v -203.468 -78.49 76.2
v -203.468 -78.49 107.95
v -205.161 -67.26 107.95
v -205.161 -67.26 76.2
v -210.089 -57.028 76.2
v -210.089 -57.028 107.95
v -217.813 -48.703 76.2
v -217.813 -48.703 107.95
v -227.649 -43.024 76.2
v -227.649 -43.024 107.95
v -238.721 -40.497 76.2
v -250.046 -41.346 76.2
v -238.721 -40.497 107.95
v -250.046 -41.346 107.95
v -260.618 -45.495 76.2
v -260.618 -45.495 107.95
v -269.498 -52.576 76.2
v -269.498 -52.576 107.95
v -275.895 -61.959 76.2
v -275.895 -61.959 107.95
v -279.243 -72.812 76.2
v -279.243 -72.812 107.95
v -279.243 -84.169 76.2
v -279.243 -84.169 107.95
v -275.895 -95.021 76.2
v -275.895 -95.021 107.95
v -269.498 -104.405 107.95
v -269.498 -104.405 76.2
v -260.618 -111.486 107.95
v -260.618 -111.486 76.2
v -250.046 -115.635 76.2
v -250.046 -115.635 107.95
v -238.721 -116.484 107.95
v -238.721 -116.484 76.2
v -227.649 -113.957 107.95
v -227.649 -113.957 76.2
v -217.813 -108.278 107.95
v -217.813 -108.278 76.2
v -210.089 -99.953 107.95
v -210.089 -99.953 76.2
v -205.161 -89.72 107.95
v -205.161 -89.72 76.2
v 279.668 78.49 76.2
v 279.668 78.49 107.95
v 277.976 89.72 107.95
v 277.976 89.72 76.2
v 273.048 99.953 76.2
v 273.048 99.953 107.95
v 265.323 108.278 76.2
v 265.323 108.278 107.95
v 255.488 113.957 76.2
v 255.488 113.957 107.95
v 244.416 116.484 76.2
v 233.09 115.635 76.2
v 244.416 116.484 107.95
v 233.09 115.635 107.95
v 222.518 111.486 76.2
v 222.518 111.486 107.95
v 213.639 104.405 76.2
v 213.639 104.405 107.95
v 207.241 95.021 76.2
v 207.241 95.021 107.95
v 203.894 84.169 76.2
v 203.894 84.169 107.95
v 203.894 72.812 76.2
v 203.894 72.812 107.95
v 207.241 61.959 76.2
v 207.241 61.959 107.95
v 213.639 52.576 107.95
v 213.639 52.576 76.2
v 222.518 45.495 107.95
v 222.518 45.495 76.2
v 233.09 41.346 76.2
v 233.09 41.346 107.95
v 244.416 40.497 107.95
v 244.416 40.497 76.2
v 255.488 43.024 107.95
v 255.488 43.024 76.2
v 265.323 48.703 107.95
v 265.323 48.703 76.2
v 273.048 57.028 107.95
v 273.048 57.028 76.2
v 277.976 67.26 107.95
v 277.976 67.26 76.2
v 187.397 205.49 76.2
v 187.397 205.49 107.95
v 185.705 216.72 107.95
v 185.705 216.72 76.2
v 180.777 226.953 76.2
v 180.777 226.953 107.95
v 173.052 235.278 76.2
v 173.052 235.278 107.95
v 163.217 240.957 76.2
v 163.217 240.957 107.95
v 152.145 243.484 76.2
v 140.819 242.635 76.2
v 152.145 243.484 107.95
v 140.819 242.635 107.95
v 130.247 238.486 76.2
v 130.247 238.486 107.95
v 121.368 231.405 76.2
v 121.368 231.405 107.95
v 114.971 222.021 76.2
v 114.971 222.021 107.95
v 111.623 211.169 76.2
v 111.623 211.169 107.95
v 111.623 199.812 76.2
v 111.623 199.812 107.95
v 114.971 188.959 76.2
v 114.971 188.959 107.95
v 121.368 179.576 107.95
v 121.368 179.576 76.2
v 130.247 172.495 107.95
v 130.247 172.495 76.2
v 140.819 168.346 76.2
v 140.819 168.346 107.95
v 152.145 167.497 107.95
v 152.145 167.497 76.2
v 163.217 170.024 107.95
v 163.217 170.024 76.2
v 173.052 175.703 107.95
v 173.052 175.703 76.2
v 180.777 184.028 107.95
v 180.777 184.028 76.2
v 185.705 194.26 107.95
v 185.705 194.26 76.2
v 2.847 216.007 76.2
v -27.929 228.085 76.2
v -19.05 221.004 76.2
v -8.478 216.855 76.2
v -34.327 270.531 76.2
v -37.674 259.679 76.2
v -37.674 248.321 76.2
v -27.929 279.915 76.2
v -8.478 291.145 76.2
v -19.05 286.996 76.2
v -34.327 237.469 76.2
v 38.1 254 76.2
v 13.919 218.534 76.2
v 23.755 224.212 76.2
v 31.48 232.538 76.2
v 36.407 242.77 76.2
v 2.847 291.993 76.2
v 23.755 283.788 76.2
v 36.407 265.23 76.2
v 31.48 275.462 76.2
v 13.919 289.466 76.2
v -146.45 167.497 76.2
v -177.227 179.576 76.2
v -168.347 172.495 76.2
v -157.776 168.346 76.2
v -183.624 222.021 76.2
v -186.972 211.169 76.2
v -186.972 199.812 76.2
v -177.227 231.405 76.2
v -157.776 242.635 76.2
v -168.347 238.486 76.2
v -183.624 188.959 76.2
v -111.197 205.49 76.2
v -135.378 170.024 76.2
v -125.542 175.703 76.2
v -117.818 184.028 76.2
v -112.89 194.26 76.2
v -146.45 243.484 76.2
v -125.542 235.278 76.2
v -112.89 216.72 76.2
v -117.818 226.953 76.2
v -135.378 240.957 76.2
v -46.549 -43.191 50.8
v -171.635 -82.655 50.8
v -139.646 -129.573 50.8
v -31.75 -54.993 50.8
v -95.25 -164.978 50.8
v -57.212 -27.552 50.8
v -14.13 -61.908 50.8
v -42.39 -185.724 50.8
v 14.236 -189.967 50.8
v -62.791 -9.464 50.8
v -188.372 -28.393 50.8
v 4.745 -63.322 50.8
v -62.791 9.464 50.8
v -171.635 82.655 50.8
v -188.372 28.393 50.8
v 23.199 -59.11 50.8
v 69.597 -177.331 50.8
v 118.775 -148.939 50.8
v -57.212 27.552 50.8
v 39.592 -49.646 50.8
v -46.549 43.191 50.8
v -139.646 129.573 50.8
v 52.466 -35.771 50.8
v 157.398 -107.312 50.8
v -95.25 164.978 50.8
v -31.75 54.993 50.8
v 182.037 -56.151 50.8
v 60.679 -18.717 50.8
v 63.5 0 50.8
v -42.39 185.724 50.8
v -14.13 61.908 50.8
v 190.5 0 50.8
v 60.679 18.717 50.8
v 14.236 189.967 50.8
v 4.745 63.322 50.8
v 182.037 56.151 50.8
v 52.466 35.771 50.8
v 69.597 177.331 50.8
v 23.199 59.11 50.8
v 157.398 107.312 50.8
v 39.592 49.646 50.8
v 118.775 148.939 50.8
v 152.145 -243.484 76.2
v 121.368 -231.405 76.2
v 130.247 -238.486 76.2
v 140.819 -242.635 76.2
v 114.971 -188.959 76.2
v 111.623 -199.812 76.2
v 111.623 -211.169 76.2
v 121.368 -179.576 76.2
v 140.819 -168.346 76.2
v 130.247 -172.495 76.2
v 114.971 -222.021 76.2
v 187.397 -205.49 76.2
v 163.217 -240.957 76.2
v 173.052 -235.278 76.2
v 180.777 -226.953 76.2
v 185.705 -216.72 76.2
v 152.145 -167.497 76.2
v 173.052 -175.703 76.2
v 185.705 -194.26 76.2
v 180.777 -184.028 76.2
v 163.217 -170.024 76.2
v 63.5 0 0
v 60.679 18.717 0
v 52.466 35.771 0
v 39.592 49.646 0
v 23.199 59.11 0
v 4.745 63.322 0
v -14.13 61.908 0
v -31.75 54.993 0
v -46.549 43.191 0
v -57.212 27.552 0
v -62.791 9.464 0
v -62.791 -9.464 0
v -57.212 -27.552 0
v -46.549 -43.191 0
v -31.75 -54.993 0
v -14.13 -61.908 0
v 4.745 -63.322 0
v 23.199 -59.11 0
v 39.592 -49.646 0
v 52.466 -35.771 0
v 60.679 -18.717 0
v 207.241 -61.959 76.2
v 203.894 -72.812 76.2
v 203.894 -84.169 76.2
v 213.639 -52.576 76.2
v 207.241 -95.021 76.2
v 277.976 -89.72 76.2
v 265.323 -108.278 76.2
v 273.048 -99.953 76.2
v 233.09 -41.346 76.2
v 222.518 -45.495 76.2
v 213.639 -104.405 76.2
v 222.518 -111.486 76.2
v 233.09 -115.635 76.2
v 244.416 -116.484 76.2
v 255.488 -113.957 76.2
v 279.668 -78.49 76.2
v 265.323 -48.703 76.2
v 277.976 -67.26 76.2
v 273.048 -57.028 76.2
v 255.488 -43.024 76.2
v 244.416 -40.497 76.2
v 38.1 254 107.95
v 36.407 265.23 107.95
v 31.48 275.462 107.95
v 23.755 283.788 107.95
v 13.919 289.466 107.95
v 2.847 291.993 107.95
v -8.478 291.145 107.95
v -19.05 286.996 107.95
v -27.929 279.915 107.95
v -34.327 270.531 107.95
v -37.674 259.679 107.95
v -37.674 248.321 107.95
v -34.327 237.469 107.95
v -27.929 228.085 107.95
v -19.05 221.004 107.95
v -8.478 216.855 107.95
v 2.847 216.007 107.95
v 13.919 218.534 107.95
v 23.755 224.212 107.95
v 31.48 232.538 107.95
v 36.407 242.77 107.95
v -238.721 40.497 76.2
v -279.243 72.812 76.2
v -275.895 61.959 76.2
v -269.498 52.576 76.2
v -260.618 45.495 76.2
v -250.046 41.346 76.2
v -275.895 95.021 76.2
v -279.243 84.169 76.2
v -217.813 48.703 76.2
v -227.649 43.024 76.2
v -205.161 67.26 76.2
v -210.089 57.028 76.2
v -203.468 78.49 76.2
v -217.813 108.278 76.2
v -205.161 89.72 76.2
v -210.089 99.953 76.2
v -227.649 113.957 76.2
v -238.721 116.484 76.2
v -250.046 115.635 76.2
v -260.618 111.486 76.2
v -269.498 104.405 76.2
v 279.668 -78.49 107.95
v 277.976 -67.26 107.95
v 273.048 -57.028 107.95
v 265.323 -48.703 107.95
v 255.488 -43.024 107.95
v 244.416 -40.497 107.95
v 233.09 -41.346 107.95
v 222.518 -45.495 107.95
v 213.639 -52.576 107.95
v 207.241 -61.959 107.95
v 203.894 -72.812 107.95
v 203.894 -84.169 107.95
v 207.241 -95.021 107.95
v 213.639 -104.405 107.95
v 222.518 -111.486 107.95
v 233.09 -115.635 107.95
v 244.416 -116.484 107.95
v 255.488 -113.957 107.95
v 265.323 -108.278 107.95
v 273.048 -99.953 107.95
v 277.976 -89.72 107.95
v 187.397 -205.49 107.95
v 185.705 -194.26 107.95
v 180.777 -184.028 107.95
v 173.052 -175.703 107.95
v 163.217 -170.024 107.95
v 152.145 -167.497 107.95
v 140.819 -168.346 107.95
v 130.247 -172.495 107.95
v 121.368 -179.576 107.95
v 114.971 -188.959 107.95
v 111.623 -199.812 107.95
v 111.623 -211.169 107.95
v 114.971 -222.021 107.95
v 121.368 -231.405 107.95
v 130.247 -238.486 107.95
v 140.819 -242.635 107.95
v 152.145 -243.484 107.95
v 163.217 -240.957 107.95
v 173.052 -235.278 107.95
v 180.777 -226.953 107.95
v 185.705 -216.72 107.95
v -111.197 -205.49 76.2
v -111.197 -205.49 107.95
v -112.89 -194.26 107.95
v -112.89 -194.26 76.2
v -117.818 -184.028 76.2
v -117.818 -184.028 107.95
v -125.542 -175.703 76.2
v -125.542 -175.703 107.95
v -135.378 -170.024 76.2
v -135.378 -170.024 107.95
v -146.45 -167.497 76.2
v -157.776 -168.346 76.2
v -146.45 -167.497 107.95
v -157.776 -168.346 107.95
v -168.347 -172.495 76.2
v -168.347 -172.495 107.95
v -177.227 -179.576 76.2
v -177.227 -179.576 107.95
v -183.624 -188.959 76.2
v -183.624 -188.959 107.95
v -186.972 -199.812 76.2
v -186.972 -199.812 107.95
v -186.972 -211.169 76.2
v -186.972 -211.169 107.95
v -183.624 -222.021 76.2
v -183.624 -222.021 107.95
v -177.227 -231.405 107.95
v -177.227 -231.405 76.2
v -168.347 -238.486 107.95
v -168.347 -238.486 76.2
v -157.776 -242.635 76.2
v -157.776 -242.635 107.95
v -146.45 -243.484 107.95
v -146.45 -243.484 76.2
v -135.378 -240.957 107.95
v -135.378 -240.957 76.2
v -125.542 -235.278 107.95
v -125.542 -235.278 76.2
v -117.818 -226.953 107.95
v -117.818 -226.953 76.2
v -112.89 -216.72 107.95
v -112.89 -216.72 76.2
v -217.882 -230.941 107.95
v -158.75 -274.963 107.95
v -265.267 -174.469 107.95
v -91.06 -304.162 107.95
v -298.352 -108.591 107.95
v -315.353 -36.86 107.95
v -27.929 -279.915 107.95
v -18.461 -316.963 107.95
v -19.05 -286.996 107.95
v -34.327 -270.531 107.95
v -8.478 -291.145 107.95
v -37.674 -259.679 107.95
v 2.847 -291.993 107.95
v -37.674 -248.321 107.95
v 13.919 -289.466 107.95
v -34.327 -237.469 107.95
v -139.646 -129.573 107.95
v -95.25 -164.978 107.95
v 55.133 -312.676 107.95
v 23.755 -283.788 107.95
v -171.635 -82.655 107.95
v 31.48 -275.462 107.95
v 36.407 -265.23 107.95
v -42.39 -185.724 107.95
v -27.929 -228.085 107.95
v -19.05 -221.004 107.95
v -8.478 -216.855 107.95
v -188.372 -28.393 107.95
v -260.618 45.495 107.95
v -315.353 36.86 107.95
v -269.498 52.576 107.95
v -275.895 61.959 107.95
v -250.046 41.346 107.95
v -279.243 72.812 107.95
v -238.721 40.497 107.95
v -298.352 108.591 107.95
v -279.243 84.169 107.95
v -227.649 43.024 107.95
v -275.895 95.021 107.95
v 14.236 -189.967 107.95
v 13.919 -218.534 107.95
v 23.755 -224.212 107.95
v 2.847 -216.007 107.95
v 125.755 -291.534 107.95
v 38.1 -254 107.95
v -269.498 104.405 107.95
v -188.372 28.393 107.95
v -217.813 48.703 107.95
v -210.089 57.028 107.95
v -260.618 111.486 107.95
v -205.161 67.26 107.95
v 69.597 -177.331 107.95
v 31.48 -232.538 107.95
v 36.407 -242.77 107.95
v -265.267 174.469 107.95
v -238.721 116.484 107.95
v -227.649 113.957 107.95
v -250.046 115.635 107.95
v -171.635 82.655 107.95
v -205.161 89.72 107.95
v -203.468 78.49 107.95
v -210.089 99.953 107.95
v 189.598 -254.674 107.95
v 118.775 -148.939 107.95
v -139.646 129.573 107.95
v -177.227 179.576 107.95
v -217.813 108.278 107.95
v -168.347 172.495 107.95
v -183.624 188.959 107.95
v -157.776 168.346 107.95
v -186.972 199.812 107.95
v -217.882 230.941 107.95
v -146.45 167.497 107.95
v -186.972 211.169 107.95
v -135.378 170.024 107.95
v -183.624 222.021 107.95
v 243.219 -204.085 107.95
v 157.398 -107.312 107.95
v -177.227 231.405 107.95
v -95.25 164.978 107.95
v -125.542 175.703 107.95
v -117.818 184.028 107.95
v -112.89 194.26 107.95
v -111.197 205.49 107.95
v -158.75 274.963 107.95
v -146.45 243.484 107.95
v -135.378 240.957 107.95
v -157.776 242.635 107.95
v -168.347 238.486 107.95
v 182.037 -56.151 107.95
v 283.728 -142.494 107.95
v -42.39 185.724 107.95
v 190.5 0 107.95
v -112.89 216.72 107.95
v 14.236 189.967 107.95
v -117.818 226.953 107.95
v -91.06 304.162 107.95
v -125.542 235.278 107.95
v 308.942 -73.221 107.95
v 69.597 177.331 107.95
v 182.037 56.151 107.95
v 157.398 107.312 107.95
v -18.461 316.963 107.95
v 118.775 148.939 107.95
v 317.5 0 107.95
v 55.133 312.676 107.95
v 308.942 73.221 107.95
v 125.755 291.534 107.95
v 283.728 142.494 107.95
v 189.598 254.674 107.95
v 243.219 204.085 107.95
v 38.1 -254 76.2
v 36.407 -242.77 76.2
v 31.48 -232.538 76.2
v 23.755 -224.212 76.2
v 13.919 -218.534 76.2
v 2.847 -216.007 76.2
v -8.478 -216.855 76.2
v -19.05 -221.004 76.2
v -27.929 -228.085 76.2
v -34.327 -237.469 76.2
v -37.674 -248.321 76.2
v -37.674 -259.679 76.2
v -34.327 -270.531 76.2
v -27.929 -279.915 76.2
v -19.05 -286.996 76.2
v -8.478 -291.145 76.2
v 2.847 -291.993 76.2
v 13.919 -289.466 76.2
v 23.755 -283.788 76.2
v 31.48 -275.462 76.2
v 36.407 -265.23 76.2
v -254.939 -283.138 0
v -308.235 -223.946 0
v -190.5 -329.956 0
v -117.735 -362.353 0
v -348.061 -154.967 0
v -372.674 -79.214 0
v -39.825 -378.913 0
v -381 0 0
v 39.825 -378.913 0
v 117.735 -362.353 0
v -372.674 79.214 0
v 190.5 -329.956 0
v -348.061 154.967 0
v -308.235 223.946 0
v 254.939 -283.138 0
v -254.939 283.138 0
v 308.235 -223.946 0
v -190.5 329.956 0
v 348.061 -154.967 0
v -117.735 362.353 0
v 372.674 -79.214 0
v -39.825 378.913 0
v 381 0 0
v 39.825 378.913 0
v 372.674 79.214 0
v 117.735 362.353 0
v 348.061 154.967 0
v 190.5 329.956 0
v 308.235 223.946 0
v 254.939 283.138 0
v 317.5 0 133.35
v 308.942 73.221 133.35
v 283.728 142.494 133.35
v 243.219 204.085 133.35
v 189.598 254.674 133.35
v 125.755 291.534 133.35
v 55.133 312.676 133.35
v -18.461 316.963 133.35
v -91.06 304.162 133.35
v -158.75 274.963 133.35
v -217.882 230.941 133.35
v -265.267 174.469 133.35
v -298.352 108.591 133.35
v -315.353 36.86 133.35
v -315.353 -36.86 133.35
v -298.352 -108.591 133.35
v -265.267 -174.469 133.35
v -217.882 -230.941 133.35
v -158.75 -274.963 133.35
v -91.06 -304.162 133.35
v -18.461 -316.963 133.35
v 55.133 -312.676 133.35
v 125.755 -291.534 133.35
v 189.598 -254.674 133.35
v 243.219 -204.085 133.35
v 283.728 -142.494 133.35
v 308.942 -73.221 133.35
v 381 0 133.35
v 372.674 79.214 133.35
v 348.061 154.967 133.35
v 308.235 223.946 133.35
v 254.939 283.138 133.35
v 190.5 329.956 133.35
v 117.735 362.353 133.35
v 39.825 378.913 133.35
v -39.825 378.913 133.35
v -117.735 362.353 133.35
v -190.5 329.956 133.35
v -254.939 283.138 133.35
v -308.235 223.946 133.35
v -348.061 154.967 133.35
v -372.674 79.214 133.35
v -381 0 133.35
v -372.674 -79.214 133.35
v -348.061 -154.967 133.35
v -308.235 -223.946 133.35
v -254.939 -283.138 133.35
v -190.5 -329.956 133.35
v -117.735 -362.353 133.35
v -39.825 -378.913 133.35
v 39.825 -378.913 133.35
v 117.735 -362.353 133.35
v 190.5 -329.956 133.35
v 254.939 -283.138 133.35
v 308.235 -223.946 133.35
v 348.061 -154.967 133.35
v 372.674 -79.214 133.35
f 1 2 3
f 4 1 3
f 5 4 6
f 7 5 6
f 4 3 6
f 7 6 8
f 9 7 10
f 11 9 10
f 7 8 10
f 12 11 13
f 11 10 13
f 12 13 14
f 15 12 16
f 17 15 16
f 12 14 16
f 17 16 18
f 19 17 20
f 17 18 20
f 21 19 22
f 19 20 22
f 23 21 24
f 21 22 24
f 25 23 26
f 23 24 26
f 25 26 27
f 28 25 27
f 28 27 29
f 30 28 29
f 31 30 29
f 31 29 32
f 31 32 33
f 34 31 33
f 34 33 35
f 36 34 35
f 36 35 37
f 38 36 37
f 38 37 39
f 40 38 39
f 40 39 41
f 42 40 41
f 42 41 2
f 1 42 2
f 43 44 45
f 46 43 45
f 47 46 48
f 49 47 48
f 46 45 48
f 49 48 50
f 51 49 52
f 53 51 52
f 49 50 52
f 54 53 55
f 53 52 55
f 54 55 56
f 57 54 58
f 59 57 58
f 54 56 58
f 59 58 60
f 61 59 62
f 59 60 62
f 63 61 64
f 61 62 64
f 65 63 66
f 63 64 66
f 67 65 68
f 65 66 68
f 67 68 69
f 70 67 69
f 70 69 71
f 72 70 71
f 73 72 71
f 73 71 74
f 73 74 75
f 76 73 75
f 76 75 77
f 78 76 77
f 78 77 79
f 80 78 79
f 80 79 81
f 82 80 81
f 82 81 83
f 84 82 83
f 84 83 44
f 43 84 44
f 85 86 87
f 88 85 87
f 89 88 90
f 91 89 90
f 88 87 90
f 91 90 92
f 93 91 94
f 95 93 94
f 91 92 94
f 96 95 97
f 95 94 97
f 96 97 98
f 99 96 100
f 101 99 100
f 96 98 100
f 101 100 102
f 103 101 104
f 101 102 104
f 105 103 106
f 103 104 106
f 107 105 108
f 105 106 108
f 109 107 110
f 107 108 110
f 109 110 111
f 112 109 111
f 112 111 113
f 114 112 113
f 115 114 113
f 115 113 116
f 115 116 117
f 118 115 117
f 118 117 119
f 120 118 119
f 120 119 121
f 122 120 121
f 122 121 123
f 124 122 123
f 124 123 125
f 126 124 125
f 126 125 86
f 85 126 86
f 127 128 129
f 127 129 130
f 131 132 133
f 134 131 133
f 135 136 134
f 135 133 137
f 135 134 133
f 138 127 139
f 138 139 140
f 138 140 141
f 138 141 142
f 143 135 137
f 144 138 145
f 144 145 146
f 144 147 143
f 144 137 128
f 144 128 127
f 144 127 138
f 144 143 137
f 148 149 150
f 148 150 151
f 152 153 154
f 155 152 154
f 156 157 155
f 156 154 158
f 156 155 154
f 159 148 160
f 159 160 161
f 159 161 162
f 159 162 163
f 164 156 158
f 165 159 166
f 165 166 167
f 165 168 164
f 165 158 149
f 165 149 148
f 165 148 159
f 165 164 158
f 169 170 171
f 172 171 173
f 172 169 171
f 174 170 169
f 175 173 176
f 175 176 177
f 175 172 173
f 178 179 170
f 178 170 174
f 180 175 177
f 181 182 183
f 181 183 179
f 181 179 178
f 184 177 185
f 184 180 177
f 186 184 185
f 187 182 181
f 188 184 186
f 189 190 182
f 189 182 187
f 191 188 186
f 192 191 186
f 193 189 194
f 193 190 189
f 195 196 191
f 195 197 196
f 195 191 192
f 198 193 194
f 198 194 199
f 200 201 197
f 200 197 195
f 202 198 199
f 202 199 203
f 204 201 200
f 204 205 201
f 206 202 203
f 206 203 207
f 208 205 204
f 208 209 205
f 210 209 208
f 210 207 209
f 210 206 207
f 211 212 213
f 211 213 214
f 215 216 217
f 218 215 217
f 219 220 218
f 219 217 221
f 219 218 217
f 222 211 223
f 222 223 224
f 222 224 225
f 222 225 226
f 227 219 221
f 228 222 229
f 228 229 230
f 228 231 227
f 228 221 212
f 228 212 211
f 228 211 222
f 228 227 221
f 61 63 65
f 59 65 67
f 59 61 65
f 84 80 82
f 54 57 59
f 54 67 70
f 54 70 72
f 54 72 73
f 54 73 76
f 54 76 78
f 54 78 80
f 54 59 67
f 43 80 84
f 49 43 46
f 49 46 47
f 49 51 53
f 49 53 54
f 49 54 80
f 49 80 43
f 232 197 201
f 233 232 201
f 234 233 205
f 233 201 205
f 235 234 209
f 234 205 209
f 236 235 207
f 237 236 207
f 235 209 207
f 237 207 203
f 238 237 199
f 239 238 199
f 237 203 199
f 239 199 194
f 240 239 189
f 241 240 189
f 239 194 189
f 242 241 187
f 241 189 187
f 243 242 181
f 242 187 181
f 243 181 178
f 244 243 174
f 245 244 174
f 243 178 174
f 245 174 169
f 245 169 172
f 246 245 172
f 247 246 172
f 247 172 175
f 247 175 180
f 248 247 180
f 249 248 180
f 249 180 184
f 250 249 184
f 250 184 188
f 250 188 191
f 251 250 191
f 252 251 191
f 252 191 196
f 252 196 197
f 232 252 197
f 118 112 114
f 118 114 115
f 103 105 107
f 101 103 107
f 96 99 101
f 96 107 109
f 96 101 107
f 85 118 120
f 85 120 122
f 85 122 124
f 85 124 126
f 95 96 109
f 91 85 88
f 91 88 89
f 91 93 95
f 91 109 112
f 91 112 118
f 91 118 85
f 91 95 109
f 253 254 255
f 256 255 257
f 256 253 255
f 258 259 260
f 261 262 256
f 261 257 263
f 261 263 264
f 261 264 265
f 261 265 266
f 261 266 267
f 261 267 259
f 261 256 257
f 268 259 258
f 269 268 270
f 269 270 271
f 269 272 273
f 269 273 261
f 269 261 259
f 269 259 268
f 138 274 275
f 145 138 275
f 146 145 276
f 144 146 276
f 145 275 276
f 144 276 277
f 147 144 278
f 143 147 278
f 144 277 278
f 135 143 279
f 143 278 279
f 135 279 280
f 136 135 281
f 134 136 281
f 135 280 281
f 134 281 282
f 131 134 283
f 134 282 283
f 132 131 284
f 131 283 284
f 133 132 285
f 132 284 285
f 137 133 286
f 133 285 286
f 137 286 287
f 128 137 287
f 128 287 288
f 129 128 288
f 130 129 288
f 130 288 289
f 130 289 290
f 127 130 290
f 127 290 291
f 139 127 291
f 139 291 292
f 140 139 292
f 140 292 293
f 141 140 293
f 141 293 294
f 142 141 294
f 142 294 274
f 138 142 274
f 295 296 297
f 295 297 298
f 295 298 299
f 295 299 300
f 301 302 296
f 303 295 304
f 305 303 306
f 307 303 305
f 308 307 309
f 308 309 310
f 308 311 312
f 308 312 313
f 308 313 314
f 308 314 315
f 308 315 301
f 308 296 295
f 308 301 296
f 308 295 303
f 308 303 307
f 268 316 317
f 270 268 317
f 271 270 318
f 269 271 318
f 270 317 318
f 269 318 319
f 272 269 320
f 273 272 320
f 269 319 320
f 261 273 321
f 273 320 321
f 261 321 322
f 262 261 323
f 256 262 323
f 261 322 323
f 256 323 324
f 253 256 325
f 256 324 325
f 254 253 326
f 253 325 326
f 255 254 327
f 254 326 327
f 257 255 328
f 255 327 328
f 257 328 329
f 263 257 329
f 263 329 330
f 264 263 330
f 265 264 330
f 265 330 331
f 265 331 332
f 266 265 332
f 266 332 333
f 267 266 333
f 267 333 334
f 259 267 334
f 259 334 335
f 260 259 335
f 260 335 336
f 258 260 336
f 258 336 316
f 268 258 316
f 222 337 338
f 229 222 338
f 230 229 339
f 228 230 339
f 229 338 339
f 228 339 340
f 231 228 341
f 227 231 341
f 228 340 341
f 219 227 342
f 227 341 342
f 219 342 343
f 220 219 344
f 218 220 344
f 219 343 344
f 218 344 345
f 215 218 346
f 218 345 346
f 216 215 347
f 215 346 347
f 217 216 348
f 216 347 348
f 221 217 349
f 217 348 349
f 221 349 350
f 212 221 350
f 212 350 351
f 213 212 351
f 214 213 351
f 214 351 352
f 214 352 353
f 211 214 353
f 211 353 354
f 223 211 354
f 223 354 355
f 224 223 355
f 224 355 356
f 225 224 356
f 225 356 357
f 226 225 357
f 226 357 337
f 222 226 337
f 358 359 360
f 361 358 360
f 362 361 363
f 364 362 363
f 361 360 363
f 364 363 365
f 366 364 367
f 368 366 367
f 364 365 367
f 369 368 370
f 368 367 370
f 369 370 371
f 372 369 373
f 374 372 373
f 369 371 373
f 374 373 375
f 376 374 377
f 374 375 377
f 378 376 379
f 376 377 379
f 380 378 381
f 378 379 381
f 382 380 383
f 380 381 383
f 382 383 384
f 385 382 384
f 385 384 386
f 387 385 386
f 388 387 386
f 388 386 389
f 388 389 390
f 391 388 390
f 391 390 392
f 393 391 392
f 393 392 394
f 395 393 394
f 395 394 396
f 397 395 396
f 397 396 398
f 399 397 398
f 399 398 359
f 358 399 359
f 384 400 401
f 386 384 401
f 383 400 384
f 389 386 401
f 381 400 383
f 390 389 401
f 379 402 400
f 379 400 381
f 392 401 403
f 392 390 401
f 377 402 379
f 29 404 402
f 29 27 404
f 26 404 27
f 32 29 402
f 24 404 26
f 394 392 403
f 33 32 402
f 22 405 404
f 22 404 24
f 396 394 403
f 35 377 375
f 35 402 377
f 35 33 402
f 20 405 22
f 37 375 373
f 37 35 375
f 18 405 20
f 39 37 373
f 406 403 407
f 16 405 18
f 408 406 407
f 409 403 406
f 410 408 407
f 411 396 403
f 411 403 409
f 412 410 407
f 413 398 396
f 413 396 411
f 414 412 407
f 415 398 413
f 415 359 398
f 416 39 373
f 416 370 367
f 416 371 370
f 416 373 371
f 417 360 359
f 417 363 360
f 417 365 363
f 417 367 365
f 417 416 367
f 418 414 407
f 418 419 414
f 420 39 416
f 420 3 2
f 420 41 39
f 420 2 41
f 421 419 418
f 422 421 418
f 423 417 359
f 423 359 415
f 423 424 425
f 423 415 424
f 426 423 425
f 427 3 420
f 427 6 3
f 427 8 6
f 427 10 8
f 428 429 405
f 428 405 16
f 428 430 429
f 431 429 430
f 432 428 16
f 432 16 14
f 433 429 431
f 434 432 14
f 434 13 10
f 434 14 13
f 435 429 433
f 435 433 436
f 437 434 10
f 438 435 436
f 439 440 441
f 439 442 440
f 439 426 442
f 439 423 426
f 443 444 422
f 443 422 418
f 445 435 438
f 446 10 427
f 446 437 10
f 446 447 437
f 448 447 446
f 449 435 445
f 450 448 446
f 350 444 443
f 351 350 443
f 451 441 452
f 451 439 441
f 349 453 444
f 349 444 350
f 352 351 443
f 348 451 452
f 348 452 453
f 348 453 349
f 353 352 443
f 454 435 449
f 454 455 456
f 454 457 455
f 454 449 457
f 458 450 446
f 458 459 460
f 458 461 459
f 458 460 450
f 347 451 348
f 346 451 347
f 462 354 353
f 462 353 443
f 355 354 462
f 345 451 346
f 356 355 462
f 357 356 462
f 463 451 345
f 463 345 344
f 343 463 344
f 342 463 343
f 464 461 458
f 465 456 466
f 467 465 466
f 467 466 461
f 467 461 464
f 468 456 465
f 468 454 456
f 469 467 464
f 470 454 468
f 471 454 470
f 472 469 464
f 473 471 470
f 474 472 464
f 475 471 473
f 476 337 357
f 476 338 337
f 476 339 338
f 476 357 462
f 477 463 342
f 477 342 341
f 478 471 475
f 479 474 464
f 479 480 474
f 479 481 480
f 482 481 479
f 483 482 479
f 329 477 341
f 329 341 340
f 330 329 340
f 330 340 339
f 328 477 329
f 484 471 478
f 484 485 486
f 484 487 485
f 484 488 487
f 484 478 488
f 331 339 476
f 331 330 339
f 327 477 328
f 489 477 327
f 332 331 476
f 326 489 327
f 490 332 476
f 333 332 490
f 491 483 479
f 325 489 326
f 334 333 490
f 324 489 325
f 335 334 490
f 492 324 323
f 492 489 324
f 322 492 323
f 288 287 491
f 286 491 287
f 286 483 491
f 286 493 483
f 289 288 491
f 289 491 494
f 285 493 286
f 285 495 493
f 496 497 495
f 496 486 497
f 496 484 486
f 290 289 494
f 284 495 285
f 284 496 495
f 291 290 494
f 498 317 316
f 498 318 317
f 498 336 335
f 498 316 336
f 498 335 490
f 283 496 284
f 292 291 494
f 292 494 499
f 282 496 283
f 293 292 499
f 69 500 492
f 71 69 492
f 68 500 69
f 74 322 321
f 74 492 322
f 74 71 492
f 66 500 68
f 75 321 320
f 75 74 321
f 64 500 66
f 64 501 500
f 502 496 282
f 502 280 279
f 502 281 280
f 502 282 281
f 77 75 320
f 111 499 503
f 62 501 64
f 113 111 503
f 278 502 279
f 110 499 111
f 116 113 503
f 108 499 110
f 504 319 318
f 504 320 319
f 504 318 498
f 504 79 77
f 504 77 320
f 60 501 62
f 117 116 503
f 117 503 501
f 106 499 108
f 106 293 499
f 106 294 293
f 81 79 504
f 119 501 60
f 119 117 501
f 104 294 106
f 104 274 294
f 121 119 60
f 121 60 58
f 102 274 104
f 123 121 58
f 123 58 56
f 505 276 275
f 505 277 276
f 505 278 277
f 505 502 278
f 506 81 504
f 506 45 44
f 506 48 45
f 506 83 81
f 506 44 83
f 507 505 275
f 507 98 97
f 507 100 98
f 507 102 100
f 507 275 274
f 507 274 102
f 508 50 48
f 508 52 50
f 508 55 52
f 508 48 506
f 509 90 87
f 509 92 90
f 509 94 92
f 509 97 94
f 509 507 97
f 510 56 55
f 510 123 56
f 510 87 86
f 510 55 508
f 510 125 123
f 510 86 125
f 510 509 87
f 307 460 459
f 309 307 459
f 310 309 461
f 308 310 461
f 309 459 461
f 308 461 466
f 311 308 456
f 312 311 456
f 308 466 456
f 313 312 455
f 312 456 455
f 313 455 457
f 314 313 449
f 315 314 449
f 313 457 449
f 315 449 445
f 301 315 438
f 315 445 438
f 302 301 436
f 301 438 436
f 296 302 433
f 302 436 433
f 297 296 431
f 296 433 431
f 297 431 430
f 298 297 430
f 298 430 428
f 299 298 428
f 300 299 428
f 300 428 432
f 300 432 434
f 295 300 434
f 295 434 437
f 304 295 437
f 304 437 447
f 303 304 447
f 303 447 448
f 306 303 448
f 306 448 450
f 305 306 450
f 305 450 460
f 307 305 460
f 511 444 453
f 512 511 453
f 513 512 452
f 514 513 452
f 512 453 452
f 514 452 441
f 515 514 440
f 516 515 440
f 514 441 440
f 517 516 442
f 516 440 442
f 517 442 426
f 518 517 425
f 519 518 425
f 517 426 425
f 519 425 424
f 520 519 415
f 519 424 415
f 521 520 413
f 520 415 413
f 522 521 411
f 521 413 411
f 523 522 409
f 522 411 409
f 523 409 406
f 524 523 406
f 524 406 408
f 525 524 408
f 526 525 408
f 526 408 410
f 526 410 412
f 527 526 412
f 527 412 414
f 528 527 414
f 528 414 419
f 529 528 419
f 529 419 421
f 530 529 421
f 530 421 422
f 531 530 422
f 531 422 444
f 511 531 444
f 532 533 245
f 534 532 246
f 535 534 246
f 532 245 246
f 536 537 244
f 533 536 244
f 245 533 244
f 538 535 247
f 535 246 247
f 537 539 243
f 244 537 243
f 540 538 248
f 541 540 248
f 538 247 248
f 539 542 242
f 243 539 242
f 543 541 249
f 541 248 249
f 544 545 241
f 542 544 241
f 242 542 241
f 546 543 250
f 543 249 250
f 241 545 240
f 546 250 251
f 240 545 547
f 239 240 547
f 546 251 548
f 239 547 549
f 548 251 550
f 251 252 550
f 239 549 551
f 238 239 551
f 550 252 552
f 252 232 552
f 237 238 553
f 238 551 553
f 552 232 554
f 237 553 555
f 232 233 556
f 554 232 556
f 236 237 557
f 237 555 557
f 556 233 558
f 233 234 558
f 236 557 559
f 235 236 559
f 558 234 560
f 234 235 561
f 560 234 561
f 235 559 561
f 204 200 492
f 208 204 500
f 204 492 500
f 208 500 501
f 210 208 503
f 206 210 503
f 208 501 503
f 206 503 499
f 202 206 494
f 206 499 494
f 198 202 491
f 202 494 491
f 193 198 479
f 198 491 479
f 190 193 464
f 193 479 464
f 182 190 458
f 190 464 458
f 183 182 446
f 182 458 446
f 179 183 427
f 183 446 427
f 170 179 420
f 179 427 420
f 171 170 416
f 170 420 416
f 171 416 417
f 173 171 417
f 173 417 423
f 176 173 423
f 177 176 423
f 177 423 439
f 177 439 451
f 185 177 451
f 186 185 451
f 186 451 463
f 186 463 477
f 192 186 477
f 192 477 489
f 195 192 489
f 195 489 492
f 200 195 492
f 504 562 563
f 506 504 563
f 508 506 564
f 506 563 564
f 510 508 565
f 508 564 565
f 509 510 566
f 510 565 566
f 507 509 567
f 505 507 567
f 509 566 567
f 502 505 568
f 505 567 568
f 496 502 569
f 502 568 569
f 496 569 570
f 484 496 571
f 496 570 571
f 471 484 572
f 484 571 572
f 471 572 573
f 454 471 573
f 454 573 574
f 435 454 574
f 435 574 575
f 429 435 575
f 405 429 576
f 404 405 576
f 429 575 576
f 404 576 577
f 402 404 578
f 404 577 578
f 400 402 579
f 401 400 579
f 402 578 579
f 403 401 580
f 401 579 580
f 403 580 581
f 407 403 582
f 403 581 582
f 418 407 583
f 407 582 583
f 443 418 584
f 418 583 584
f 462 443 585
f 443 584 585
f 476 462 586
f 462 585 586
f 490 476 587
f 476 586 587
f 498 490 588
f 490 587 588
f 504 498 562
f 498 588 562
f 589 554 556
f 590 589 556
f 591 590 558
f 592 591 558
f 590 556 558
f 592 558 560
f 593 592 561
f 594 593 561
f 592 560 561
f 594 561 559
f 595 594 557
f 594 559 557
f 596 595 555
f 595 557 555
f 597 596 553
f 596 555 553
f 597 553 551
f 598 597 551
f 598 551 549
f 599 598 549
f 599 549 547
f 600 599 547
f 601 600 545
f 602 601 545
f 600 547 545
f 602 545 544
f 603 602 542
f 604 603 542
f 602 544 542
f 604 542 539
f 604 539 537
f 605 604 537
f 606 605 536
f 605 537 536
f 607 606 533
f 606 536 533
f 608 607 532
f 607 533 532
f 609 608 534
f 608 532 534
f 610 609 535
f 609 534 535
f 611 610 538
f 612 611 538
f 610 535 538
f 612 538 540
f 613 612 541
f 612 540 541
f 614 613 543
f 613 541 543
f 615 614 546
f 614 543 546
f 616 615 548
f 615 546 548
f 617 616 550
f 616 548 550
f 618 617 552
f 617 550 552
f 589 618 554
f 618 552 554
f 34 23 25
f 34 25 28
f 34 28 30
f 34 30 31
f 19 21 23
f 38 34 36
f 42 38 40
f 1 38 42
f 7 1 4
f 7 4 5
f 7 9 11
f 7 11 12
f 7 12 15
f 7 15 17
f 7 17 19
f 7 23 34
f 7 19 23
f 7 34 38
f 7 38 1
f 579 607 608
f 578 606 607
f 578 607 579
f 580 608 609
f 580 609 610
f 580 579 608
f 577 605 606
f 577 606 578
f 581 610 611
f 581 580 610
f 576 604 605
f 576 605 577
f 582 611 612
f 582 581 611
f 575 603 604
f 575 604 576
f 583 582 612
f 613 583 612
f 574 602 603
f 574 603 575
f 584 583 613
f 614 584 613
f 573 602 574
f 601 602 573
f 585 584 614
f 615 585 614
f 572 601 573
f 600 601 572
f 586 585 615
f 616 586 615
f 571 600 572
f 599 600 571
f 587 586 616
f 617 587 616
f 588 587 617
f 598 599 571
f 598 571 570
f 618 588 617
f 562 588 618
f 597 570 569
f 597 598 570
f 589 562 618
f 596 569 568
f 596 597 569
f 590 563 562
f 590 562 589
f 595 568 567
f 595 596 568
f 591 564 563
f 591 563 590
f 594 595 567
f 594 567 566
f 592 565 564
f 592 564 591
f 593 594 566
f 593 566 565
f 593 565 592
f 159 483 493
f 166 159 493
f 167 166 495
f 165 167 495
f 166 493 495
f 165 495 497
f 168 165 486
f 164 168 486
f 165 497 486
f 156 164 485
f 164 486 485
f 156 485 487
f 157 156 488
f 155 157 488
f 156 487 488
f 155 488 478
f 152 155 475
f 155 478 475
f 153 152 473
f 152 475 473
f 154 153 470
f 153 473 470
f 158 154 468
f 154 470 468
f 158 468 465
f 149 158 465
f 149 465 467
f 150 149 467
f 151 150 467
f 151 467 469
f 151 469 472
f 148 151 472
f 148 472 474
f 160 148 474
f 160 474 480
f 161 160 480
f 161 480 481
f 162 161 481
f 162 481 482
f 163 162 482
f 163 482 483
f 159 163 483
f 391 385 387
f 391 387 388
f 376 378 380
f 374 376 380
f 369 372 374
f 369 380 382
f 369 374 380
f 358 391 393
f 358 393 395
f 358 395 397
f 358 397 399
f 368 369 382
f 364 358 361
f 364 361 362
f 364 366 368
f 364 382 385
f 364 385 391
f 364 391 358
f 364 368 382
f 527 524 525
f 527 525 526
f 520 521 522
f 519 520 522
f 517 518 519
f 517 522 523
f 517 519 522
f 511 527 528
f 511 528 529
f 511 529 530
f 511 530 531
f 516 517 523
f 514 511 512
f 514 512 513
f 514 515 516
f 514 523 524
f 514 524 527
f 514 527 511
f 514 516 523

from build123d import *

# Parameters (mm, degrees)
SKETCH1_R           = 381
BOSS_EXTRUDE1_DEPTH = 133.35
SKETCH2_R           = 63.5
CUT_EXTRUDE1_DEPTH  = 556.071367033
SKETCH6_R           = 317.5
CUT_EXTRUDE5_DEPTH  = 25.4
SKETCH7_R           = 190.5
CUT_EXTRUDE6_DEPTH  = 82.55
SKETCH8_R           = 38.1
CUT_EXTRUDE8_DEPTH  = 57.15


with BuildPart() as part:
    # Sketch1 → Boss-Extrude1 (new body)
    with BuildSketch(Plane.XY):
        Circle(SKETCH1_R)
    extrude(amount=BOSS_EXTRUDE1_DEPTH)

    # Sketch2 → Cut-Extrude1 (cut, through all)
    with BuildSketch(Plane.XY.offset(133.35)):
        Circle(SKETCH2_R)
    extrude(amount=-CUT_EXTRUDE1_DEPTH, mode=Mode.SUBTRACT)

    # Sketch6 → Cut-Extrude5 (cut)
    with BuildSketch(Plane.XY.offset(133.35)):
        Circle(SKETCH6_R)
    extrude(amount=-CUT_EXTRUDE5_DEPTH, mode=Mode.SUBTRACT)

    # Sketch7 → Cut-Extrude6 (cut)
    with BuildSketch(Plane.XY.offset(133.35)):
        Circle(SKETCH7_R)
    extrude(amount=-CUT_EXTRUDE6_DEPTH, mode=Mode.SUBTRACT)

    # Sketch8 → Cut-Extrude8 (cut)
    with BuildSketch(Plane.XY.offset(133.35)):
        with Locations((0, 254)):
            Circle(SKETCH8_R)
        with Locations((149.297454082, 205.490316571)):
            Circle(SKETCH8_R)
        with Locations((241.568355139, 78.490316571)):
            Circle(SKETCH8_R)
        with Locations((241.568355139, -78.490316571)):
            Circle(SKETCH8_R)
        with Locations((149.297454082, -205.490316571)):
            Circle(SKETCH8_R)
        with Locations((0, -254)):
            Circle(SKETCH8_R)
        with Locations((-149.297454082, -205.490316571)):
            Circle(SKETCH8_R)
        with Locations((-241.568355139, -78.490316571)):
            Circle(SKETCH8_R)
        with Locations((-241.568355139, 78.490316571)):
            Circle(SKETCH8_R)
        with Locations((-149.297454082, 205.490316571)):
            Circle(SKETCH8_R)
    extrude(amount=-CUT_EXTRUDE8_DEPTH, mode=Mode.SUBTRACT)


solid = part.part
